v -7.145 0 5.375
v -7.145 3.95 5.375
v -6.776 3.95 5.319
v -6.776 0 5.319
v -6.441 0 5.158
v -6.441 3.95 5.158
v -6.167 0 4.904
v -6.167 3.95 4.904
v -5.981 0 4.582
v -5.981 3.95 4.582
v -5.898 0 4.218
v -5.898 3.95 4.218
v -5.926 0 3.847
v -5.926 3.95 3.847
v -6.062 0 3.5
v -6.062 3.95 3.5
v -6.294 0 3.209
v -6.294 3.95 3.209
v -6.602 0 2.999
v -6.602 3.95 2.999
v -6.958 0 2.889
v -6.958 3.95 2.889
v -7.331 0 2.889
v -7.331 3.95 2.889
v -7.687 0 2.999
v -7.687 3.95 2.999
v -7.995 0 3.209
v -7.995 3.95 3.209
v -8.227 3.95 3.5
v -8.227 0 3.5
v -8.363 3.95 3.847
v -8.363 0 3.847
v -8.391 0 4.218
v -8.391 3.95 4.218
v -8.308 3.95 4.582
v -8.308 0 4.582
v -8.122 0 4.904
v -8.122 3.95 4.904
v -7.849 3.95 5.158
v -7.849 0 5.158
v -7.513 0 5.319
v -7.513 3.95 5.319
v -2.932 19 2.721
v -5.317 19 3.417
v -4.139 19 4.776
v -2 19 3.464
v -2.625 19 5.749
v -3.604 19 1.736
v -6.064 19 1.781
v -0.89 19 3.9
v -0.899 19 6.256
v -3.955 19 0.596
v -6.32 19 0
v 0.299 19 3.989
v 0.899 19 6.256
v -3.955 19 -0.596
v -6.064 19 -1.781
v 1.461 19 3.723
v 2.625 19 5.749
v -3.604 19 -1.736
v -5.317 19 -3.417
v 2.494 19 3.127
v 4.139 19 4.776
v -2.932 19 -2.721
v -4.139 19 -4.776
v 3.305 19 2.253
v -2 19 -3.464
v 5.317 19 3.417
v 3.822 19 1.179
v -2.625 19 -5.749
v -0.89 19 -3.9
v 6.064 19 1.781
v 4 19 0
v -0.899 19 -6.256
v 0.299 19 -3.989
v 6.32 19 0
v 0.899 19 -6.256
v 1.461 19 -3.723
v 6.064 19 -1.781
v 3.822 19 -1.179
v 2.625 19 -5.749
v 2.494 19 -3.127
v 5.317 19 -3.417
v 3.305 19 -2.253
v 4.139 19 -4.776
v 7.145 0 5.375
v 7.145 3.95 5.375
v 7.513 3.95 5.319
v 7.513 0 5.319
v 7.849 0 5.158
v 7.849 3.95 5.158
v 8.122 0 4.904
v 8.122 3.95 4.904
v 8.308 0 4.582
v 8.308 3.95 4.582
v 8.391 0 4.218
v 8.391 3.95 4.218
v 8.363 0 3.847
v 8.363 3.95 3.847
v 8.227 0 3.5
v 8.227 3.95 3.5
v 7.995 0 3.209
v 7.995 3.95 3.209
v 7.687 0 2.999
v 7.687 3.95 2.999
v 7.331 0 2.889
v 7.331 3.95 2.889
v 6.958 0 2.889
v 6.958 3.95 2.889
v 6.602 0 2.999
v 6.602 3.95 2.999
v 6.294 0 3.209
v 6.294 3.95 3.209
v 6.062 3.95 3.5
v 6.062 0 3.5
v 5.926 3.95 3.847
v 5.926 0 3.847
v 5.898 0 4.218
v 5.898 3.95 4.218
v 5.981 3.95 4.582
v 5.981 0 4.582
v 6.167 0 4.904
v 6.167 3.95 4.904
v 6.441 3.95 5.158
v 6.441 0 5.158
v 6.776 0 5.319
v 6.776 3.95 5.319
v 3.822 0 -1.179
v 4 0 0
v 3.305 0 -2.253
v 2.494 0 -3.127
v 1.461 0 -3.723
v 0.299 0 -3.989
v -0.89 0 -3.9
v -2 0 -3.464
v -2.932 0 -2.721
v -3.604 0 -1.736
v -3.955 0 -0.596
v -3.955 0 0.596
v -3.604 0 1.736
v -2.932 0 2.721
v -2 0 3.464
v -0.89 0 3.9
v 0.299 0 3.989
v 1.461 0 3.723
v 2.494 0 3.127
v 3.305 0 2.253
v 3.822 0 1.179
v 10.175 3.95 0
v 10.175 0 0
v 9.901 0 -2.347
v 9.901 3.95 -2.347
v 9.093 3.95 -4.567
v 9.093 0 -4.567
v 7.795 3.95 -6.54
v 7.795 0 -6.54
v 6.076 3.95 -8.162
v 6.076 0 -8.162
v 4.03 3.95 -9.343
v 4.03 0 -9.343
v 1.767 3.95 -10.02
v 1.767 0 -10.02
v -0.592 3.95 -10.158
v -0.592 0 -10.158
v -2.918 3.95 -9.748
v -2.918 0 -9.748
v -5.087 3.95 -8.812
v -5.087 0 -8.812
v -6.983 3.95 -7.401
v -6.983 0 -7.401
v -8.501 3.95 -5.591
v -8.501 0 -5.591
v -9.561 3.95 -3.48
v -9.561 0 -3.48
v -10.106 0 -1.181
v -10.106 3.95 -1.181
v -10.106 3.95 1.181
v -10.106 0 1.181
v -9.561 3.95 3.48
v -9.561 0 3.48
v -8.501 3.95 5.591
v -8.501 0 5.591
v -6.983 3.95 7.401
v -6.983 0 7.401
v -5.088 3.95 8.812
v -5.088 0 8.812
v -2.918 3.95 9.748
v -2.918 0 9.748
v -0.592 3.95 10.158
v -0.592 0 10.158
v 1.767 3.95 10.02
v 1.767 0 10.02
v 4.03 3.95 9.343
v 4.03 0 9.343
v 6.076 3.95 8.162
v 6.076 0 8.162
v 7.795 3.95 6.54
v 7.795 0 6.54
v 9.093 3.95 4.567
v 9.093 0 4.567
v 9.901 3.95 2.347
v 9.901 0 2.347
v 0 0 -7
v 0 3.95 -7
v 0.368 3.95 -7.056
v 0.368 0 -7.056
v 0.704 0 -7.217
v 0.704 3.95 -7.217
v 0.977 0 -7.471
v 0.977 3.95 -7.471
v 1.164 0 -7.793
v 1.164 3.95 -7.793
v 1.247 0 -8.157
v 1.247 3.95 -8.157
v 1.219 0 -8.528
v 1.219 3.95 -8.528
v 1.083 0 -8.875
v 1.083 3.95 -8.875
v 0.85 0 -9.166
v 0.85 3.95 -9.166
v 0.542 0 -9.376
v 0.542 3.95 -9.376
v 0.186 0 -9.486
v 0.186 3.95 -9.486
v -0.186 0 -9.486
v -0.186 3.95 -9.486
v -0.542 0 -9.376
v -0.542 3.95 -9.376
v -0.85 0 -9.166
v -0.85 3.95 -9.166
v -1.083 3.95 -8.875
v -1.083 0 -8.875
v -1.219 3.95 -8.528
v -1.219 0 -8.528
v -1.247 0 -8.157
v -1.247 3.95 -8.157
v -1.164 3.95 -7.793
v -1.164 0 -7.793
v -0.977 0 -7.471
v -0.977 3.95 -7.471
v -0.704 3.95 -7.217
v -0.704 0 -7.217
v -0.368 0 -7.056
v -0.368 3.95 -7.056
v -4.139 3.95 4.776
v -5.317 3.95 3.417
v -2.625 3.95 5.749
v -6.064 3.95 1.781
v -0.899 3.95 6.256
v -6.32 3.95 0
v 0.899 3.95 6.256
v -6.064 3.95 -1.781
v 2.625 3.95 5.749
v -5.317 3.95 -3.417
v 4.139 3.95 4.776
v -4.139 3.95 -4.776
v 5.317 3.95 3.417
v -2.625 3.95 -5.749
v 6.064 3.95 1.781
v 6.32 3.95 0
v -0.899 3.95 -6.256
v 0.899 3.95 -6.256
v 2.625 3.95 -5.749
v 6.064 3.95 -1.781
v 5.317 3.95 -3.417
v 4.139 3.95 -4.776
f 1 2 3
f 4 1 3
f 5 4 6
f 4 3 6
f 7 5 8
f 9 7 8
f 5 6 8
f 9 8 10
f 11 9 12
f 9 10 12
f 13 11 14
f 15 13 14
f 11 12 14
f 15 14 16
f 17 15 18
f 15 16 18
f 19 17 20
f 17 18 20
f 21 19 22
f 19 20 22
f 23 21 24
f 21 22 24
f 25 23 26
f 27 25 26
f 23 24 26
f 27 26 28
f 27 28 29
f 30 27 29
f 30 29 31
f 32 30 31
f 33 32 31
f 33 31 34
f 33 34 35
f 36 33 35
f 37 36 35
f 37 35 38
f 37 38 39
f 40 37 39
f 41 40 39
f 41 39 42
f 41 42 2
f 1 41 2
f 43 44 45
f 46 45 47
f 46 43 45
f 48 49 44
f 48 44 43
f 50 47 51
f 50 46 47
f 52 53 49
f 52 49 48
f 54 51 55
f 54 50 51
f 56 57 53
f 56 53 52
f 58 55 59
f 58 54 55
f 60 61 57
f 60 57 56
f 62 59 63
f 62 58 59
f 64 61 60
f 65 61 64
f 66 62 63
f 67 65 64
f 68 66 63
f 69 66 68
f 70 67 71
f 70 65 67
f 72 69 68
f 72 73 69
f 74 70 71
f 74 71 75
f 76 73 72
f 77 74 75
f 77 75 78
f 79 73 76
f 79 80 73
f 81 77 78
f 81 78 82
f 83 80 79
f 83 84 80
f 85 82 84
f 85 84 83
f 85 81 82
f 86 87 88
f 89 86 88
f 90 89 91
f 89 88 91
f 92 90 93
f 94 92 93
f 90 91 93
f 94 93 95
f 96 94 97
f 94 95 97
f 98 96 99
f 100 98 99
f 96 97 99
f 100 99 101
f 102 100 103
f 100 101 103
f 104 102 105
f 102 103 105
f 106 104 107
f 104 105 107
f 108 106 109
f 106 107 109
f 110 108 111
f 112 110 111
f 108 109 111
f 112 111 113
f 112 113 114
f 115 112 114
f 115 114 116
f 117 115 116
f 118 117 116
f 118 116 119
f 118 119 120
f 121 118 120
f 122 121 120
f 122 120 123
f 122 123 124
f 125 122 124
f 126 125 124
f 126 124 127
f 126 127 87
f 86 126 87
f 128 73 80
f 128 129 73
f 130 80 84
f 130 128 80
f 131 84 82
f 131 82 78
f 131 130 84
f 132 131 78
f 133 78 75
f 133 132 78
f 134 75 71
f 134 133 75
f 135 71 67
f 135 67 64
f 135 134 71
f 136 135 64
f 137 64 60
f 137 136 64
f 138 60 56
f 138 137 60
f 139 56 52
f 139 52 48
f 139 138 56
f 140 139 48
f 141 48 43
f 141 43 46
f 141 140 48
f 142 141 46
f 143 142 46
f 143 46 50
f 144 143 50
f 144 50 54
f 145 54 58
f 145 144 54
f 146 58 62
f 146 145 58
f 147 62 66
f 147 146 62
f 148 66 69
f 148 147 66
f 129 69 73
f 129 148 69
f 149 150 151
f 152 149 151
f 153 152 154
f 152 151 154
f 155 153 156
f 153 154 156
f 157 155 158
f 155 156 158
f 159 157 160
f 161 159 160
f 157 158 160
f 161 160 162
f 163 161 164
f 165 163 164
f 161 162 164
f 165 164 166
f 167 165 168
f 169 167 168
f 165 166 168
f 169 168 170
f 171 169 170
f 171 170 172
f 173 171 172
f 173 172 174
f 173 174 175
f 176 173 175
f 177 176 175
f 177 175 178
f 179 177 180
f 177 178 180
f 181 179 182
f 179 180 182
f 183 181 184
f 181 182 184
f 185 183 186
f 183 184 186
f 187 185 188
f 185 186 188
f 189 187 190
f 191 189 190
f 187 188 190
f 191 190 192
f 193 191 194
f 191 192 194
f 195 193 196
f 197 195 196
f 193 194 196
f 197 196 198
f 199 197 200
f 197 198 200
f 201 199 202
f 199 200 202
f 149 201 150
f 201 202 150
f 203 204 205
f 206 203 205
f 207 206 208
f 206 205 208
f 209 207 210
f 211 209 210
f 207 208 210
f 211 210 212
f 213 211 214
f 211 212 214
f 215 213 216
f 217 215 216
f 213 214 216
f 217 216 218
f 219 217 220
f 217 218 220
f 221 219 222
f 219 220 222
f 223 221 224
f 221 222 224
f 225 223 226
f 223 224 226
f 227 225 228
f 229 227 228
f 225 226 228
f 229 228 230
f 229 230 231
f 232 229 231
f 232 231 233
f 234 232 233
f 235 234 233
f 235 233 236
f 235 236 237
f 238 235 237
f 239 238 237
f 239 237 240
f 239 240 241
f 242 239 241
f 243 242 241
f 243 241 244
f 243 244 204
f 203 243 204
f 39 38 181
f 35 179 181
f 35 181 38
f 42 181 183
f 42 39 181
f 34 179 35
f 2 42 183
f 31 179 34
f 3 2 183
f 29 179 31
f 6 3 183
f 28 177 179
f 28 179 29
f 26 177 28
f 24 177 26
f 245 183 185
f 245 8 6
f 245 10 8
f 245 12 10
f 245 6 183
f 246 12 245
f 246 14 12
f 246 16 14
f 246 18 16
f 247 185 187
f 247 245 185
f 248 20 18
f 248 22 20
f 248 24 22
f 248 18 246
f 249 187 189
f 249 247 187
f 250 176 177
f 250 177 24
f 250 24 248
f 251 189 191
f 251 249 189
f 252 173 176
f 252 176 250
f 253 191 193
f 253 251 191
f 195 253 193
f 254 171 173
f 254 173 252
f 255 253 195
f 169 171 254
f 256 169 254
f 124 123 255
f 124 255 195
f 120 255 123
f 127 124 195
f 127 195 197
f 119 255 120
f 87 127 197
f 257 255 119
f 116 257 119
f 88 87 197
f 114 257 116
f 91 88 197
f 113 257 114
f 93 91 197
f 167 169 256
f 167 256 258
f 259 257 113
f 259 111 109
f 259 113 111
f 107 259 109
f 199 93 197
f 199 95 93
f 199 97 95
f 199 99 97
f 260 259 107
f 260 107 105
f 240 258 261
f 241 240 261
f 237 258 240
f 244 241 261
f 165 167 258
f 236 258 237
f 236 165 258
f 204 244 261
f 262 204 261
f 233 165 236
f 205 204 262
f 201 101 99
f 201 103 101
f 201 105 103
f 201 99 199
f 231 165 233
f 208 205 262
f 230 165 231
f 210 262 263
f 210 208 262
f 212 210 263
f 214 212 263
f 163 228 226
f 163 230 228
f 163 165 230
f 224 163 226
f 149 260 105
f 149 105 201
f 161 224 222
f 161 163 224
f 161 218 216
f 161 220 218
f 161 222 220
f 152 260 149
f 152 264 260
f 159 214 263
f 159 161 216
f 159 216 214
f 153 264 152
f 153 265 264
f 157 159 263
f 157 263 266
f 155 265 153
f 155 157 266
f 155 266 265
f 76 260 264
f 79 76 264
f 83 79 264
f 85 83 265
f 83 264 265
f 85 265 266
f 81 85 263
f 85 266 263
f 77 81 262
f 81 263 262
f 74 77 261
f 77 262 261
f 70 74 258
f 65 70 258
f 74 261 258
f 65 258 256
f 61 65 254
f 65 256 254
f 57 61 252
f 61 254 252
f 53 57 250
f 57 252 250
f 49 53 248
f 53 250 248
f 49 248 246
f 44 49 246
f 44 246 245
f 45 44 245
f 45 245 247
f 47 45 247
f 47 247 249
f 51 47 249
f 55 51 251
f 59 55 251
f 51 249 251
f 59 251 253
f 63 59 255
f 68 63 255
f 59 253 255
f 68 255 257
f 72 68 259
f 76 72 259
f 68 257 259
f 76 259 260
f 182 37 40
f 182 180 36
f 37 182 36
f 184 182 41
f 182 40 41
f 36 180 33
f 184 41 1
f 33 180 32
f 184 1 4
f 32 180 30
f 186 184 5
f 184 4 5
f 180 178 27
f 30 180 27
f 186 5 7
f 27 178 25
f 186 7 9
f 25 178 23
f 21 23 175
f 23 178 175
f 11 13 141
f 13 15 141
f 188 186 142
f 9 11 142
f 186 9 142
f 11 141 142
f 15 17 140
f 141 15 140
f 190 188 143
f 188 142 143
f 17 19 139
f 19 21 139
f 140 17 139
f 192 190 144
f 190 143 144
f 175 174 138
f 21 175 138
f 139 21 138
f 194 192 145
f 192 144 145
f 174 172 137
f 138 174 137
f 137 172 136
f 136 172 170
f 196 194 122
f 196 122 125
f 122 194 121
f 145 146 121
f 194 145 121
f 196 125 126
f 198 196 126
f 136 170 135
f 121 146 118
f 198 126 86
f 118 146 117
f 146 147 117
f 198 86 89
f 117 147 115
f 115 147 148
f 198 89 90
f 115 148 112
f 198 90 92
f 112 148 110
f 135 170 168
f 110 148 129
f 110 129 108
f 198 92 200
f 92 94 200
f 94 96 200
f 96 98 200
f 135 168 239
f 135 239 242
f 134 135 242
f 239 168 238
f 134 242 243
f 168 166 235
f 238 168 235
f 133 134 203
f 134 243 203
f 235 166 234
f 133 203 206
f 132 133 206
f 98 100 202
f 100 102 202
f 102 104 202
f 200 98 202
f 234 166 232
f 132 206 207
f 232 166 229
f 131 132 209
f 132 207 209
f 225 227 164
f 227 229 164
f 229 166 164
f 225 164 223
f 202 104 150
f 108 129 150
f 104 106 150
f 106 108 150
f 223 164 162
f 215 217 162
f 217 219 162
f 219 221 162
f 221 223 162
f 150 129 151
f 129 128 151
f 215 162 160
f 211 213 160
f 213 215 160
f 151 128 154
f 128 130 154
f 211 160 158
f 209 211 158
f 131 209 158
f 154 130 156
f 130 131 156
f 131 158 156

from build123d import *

# Parameters (mm, degrees)
SKETCH1_R                   = 10.175
SKETCH1_R_2                 = 4
BOSS_EXTRUDE1_DEPTH         = 3.95
SKETCH2_R                   = 6.32
SKETCH2_R_2                 = 4
BOSS_EXTRUDE2_DEPTH         = 15.05
TAP_DRILL_FOR_M3_TAP1_D     = 2.5
TAP_DRILL_FOR_M3_TAP1_DEPTH = 3.95


with BuildPart() as part:
    # Sketch1 → Boss-Extrude1 (new body)
    with BuildSketch(Plane(origin=(0, 0, 0), x_dir=(1, 0, 0), z_dir=(0, 1, 0))):
        Circle(SKETCH1_R)
        Circle(SKETCH1_R_2, mode=Mode.SUBTRACT)
    extrude(amount=BOSS_EXTRUDE1_DEPTH)

    # Sketch2 → Boss-Extrude2 (add)
    with BuildSketch(Plane(origin=(0, 3.95, 0), x_dir=(1, 0, 0), z_dir=(0, 1, 0))):
        Circle(SKETCH2_R)
        Circle(SKETCH2_R_2, mode=Mode.SUBTRACT)
    extrude(amount=BOSS_EXTRUDE2_DEPTH)

    # Tap Drill for M3 Tap1
    with Locations(Plane(origin=(-7.144709581, 0, 4.125), x_dir=(0, 0, -1), z_dir=(0, -1, 0))):
        with Locations((0, 0), (0, 14.289419162), (12.375, 7.144709581)):
            Hole(TAP_DRILL_FOR_M3_TAP1_D / 2, depth=TAP_DRILL_FOR_M3_TAP1_DEPTH)


solid = part.part
